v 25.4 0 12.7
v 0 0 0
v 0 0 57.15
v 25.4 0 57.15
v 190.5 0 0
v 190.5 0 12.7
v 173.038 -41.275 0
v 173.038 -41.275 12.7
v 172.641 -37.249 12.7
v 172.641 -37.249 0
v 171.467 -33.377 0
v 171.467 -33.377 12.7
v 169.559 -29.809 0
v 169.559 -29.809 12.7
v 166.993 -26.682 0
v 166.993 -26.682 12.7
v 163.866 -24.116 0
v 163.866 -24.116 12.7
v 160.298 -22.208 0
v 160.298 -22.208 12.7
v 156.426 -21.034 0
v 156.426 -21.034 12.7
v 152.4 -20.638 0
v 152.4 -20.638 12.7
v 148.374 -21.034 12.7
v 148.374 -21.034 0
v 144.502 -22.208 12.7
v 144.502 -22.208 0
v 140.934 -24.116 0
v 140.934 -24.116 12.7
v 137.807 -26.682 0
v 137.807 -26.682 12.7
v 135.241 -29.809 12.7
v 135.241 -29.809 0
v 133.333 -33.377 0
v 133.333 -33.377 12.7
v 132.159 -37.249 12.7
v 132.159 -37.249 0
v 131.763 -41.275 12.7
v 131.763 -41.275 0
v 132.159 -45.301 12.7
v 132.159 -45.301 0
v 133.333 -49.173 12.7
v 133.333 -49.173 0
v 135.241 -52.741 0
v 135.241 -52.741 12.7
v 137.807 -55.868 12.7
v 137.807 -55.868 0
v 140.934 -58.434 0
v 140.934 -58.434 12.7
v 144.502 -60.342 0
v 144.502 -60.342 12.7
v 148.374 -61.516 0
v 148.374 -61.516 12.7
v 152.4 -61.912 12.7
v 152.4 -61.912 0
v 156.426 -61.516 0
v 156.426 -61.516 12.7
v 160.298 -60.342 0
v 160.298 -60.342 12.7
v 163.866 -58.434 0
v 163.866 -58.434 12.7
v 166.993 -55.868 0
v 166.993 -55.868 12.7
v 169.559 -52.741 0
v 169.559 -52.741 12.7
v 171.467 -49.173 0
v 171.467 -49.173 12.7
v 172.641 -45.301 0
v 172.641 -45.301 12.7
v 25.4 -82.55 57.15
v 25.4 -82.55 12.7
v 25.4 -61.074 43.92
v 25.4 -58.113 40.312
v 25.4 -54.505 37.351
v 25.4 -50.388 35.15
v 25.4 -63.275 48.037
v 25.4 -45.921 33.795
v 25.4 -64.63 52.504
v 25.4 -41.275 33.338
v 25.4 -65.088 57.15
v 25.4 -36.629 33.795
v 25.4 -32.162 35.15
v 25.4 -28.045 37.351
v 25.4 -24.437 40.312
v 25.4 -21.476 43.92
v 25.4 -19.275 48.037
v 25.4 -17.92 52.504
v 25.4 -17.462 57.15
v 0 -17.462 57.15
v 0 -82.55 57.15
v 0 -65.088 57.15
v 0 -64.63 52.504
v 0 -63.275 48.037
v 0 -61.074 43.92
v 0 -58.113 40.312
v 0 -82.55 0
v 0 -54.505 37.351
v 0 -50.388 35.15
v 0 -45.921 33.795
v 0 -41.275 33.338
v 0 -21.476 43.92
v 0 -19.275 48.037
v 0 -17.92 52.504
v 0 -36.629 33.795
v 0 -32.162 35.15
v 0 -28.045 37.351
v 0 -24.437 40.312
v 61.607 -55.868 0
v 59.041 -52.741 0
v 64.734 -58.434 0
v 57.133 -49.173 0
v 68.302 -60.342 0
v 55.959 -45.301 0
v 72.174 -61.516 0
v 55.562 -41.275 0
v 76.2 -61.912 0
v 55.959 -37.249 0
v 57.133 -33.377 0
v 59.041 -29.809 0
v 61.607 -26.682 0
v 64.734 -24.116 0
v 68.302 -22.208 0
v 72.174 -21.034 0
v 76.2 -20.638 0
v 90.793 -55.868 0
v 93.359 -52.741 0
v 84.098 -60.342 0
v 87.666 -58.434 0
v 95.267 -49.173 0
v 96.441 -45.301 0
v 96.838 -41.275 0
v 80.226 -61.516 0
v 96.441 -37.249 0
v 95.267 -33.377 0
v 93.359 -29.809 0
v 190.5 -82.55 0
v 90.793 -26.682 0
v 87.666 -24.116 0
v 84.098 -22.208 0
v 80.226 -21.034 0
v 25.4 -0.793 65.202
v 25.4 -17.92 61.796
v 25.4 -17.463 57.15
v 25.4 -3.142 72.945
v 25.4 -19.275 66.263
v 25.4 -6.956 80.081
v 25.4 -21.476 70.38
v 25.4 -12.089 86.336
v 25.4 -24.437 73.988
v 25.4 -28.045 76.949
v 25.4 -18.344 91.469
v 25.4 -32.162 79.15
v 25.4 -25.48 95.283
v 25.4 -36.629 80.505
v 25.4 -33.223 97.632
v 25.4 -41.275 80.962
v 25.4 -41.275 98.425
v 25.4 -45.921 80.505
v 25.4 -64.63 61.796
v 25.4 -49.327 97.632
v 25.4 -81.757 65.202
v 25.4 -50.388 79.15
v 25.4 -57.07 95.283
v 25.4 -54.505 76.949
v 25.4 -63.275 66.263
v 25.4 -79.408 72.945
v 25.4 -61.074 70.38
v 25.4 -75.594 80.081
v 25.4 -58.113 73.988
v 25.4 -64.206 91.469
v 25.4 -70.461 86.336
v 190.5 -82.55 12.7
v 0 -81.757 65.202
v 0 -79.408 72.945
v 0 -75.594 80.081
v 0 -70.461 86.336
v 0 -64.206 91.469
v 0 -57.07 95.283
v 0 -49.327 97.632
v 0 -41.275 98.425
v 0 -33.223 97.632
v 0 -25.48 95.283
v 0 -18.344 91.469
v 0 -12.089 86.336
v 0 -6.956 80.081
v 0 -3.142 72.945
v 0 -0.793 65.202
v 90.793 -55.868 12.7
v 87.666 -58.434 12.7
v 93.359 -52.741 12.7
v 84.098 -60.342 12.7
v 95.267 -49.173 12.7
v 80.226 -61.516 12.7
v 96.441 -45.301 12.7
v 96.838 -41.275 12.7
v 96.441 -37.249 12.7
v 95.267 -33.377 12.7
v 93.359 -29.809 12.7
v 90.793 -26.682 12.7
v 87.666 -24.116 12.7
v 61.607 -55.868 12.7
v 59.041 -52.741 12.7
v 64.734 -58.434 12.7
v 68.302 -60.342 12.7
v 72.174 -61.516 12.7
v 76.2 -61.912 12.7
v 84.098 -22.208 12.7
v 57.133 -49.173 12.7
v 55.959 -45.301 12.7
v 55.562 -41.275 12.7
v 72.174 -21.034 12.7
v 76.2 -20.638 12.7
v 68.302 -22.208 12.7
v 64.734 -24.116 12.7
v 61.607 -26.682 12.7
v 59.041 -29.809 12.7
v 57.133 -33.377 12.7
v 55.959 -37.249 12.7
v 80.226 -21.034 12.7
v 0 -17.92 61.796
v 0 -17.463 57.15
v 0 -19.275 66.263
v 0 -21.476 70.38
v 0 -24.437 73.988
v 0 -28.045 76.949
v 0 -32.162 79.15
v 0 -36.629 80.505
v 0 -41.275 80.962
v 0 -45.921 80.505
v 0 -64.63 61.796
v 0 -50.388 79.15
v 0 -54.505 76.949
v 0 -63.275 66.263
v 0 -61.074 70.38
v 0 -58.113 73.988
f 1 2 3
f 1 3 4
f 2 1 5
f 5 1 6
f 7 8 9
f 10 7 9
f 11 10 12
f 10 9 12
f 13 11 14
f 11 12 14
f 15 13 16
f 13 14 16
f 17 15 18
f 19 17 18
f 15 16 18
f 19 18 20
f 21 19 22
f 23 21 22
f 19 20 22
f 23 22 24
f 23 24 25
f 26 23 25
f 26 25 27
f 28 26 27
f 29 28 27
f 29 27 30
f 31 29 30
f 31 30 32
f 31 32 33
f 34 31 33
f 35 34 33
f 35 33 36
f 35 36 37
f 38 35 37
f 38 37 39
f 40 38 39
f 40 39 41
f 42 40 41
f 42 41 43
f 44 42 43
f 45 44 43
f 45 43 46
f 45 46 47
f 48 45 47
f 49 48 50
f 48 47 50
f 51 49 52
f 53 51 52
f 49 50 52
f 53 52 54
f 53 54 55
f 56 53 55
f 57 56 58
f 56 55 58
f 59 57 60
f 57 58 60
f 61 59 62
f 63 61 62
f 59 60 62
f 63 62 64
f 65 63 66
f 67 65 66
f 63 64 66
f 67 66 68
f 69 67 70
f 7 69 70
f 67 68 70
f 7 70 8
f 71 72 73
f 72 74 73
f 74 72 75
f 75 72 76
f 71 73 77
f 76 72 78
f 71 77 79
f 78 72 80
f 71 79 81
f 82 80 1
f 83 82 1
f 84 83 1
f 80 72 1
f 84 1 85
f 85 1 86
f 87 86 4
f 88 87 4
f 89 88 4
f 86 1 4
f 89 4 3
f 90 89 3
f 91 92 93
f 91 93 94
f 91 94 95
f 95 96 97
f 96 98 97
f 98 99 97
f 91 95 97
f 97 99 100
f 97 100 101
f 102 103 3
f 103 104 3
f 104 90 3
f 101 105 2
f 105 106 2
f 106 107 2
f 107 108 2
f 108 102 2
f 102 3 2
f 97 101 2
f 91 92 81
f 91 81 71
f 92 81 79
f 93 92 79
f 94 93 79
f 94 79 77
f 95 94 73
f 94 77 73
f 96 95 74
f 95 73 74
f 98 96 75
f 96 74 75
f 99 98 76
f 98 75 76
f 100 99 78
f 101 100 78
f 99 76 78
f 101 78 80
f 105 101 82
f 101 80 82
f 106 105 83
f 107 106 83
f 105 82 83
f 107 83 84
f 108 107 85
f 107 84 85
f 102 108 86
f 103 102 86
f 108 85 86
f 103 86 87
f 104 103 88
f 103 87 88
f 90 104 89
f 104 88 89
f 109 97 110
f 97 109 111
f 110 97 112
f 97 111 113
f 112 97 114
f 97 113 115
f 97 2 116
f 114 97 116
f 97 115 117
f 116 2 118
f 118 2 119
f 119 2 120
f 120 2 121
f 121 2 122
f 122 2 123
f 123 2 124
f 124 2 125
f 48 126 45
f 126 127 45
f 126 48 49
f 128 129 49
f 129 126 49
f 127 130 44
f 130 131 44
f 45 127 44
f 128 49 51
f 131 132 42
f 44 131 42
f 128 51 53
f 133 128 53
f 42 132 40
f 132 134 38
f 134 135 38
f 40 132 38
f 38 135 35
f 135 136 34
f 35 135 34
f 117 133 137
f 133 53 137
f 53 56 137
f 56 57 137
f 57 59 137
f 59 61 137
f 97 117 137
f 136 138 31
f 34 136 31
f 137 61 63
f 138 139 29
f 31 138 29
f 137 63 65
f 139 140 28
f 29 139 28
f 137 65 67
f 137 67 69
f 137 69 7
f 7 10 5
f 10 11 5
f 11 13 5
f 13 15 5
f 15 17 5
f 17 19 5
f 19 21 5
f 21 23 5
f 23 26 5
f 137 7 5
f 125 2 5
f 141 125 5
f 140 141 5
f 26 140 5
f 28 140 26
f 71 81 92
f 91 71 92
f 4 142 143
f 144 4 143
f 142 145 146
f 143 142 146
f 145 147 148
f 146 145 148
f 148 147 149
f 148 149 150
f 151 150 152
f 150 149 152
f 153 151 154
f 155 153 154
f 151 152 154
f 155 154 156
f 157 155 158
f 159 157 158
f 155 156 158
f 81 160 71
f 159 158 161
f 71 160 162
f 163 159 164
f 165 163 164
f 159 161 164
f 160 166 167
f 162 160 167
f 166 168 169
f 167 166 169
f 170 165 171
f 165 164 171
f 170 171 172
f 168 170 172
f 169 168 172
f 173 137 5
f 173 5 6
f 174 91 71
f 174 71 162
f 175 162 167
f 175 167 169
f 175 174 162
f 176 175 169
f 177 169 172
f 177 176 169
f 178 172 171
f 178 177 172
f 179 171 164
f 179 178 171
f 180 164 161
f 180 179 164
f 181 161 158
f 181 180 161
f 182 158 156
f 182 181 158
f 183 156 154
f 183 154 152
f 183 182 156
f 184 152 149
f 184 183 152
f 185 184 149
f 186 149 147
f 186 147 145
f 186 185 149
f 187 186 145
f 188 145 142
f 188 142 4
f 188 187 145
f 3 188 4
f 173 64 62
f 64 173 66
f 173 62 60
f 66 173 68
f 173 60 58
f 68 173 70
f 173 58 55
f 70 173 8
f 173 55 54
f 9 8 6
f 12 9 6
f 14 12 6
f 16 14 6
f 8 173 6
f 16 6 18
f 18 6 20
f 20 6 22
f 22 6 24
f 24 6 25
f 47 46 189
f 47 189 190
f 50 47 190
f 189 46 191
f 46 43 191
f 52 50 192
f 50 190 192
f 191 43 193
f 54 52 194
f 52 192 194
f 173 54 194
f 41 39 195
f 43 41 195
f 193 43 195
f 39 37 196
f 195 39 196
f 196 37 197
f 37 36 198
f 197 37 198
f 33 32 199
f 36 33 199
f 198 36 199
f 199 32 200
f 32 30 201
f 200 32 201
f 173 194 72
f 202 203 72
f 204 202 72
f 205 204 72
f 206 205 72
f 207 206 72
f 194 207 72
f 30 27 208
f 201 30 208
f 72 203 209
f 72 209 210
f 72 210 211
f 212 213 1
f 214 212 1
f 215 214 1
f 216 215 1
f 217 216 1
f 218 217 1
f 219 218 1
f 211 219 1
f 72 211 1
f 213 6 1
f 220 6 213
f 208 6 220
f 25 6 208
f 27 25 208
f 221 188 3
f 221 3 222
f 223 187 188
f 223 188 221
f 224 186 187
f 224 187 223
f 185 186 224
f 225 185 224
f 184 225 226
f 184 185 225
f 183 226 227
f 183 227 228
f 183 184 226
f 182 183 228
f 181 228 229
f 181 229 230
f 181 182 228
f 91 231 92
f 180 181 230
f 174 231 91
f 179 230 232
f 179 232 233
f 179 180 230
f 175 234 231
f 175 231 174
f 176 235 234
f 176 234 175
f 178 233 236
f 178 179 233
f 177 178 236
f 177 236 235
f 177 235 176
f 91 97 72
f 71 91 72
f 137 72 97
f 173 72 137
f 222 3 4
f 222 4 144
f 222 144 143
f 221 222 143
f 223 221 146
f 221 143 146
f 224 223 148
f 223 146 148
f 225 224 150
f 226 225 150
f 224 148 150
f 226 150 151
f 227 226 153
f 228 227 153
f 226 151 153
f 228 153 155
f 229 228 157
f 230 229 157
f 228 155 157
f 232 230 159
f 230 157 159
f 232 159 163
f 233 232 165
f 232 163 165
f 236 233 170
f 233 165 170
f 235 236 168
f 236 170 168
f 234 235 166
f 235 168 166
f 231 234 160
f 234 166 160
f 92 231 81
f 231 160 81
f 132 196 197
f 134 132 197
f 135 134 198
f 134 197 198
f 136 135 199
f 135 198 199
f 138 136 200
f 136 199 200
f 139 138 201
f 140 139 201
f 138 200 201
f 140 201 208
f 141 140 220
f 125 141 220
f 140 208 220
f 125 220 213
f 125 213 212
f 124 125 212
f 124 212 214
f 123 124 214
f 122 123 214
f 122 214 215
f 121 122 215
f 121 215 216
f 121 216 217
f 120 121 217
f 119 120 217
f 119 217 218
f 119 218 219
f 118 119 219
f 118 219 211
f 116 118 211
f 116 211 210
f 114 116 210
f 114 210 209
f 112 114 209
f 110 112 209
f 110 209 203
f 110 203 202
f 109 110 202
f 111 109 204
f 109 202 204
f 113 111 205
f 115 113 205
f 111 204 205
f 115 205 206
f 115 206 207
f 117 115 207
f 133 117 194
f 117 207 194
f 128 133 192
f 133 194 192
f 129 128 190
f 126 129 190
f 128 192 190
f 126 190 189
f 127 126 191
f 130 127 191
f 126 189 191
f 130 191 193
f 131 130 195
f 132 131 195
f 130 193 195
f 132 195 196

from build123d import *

# Parameters (mm, degrees)
F1_DEPTH = 82.55
F2_R     = 20.6375
F3_DEPTH = 12.701
F5_DEPTH = 25.4
F7_DEPTH = 25.4
F9_DEPTH = 25.4


with BuildPart() as f1:
    # F0 (on Front) → F1 (new body)
    with BuildSketch(Plane.XZ):
        Polygon((0, 57.15), (0, 0), (190.5, 0), (190.5, 12.7), (25.4, 12.7), (25.4, 57.15), align=None)
    extrude(amount=F1_DEPTH)

    # F2 (on face) → F3 (cut, through all)
    with BuildSketch(Plane.XY.offset(12.7)):
        with Locations((76.2, -41.275)):
            Circle(F2_R)
        with Locations((152.4, -41.275)):
            Circle(F2_R)
    extrude(amount=-F3_DEPTH, mode=Mode.SUBTRACT)

    # F8 (on face) → F9 (cut)
    with BuildSketch(Plane.YZ.offset(25.4)):
        with BuildLine():
            ThreePointArc((-65.0875, 57.15), (-41.275, 33.3375), (-17.4625, 57.15))
            Line((-17.4625, 57.15), (-65.0875, 57.15))
        make_face()
    extrude(amount=-F9_DEPTH, mode=Mode.SUBTRACT)


with BuildPart() as f5:
    # F4 (on face) → F5 (new body)
    with BuildSketch(Plane(origin=(0, 0, 0), x_dir=(0, -1, 0), z_dir=(-1, 0, 0))):
        with BuildLine():
            Line((0, 57.15), (82.55, 57.15))
            ThreePointArc((82.55, 57.15), (41.275, 98.425), (0, 57.15))
        make_face()
    extrude(amount=-F5_DEPTH)

    # F6 (on face) → F7 (cut)
    with BuildSketch(Plane.YZ.offset(25.4)):
        with BuildLine():
            Line((-65.0875, 57.15), (-17.4625, 57.15))
            ThreePointArc((-17.4625, 57.15), (-41.275, 80.9625), (-65.0875, 57.15))
        make_face()
    extrude(amount=-F7_DEPTH, mode=Mode.SUBTRACT)


solid = Compound([f1.part, f5.part])
